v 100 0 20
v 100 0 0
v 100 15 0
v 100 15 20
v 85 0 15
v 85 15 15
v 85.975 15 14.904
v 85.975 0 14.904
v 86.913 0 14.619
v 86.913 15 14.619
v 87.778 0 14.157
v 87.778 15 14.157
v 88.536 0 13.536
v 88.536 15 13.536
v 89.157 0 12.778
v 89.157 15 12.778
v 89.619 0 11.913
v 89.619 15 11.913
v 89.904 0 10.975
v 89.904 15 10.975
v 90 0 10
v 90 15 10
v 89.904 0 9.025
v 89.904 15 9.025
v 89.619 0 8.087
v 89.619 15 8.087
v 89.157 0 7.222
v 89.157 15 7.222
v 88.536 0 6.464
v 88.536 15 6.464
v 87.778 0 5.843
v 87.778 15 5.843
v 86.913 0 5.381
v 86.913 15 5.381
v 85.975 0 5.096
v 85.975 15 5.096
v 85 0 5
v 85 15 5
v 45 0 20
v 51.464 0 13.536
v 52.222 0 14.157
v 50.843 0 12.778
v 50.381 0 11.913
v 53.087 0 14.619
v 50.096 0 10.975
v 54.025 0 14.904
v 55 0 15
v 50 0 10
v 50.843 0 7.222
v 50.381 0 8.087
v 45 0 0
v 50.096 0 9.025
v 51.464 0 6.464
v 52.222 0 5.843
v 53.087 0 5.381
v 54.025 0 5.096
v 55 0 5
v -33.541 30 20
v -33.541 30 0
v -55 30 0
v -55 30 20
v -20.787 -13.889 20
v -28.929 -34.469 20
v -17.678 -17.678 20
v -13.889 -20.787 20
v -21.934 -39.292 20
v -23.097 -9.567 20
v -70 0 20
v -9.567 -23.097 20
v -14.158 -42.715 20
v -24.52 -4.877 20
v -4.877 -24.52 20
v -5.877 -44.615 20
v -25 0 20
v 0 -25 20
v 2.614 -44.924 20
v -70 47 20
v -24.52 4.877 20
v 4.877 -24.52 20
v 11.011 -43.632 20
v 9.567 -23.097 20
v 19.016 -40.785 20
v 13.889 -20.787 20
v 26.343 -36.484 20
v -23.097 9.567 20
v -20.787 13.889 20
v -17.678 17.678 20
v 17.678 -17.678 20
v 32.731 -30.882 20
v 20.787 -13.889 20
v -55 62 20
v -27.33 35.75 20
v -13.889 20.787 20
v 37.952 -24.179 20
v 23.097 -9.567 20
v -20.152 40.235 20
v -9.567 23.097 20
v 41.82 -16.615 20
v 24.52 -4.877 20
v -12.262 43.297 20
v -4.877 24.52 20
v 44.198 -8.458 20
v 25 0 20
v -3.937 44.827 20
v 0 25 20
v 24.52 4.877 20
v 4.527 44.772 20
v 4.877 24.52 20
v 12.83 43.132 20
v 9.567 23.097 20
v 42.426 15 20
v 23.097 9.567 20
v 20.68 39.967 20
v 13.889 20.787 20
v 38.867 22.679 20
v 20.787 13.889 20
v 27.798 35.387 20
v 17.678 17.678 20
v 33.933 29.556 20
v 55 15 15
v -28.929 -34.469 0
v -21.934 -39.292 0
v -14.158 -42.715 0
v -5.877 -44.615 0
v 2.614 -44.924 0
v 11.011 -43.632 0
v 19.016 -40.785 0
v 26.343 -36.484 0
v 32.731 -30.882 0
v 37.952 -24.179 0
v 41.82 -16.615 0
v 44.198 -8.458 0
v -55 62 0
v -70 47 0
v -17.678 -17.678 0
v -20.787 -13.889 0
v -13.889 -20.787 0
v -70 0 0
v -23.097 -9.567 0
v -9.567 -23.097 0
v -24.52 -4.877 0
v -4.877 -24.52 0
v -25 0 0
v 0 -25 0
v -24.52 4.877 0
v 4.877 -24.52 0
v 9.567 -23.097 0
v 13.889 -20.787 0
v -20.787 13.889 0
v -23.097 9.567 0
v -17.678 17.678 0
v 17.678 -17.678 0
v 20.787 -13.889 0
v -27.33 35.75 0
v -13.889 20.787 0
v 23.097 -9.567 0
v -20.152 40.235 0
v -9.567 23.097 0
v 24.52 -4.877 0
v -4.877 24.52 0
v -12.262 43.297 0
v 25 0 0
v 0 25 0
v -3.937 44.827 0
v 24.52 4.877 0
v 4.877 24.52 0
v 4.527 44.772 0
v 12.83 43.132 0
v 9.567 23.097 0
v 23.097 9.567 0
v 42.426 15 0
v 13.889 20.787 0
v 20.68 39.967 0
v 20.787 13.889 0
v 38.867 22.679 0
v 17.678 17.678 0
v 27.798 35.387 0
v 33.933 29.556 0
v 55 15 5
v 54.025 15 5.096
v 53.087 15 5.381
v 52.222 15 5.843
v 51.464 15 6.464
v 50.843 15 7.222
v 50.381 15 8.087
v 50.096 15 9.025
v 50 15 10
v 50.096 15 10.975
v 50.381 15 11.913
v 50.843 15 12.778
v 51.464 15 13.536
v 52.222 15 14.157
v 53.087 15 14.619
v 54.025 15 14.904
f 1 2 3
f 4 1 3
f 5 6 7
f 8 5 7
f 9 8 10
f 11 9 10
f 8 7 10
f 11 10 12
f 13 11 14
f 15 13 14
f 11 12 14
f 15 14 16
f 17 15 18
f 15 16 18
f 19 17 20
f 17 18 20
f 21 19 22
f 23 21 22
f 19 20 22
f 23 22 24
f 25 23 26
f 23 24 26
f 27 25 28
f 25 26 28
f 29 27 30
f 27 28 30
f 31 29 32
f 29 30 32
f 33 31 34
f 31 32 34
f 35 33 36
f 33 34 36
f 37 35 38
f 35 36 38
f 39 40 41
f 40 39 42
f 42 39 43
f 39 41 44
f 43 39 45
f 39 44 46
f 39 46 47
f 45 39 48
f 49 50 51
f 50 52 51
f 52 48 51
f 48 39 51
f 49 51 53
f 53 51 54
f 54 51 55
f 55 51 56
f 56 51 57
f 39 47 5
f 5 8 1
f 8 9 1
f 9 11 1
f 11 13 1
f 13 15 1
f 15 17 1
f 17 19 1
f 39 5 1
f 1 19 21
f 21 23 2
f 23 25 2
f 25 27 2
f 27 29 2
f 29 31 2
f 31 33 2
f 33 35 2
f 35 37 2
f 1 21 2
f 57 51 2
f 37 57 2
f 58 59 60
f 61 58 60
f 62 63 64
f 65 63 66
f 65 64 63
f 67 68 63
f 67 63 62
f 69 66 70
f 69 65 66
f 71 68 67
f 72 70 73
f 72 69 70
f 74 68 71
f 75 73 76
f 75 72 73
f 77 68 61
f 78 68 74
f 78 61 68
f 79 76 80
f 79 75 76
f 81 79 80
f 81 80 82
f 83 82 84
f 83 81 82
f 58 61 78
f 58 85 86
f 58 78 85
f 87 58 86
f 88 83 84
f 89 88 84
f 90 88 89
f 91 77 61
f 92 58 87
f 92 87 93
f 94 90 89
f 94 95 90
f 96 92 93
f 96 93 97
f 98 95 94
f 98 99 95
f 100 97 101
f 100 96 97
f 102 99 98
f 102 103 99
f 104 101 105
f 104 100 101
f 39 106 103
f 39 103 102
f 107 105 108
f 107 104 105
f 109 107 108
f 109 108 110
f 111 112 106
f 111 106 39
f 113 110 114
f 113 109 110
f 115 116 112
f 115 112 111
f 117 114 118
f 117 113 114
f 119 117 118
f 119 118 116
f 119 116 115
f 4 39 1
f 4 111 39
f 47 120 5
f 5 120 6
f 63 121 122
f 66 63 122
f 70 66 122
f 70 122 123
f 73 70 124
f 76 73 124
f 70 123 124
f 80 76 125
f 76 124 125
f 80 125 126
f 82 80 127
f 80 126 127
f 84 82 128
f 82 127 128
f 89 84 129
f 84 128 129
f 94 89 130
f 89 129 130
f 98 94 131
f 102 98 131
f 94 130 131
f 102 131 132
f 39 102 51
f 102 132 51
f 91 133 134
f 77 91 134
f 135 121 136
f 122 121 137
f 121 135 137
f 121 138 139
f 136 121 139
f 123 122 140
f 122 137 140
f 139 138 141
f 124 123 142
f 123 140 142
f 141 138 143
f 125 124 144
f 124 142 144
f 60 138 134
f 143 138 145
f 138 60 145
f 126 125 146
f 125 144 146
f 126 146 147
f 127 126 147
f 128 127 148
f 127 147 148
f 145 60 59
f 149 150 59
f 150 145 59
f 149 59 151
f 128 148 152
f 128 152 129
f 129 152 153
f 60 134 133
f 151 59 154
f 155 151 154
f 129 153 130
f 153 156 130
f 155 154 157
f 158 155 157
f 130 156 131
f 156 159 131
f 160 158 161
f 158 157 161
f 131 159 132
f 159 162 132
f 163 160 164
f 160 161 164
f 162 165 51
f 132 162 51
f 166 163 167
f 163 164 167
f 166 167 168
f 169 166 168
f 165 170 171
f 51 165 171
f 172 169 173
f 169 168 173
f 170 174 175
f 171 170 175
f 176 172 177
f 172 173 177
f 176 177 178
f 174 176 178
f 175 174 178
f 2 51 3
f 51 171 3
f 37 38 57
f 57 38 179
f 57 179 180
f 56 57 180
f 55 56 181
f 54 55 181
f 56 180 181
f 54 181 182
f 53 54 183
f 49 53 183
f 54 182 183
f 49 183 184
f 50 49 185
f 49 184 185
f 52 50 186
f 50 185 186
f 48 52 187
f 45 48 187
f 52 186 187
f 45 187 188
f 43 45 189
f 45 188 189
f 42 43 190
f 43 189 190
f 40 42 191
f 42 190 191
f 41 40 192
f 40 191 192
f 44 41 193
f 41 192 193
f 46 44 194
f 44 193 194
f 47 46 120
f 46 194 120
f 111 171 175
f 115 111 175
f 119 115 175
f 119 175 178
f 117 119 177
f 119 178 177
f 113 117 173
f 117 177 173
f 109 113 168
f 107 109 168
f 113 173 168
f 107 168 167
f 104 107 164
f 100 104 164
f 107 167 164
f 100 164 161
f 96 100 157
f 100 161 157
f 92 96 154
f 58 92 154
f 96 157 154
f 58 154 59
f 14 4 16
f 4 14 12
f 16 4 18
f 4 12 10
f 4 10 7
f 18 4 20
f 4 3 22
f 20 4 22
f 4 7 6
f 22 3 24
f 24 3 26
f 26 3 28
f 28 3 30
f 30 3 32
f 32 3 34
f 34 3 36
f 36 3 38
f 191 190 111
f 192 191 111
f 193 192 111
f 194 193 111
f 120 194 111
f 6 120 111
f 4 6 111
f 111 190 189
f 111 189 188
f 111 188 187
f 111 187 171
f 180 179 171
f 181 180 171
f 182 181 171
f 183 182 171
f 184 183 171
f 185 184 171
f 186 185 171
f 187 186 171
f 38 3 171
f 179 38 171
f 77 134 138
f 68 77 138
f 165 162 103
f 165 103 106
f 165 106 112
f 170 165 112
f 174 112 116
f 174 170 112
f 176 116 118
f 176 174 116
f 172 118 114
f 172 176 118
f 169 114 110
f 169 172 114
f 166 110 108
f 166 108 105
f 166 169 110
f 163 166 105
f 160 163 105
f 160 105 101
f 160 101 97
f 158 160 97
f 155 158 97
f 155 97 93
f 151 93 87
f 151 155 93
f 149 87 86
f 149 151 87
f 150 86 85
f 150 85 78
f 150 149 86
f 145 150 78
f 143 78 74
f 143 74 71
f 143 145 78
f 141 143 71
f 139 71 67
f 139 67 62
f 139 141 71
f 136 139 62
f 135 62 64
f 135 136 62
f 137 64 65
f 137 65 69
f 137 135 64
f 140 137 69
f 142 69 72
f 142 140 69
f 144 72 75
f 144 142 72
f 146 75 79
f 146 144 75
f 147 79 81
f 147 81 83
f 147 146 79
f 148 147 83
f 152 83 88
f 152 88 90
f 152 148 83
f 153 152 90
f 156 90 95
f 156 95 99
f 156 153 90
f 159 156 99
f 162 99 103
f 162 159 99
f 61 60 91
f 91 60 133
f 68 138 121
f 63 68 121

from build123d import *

# Parameters (mm, degrees)
SKETCH1_R           = 25
BOSS_EXTRUDE1_DEPTH = 20
CUT_EXTRUDE1_DEPTH  = 61


with BuildPart() as part:
    # Sketch1 → Boss-Extrude1 (new body)
    with BuildSketch(Plane.XY):
        with BuildLine():
            Line((-70, 0), (-28.928571429, -34.469374162))
            ThreePointArc((-28.928571429, -34.469374162), (19.015970731, -40.784713523), (45, 0))
            Line((45, 0), (100, 0))
            Line((100, 0), (100, 15))
            Line((100, 15), (42.426406871, 15))
            ThreePointArc((42.426406871, 15), (8.717082451, 44.14762138), (-33.541019662, 30))
            Line((-33.541019662, 30), (-55, 30))
            Line((-55, 30), (-55, 62))
            Line((-55, 62), (-70, 47))
            Line((-70, 47), (-70, 0))
        make_face()
        Circle(SKETCH1_R, mode=Mode.SUBTRACT)
    extrude(amount=BOSS_EXTRUDE1_DEPTH)

    # Sketch2 → Cut-Extrude1 (cut, through all)
    with BuildSketch(Plane(origin=(0, 15, 0), x_dir=(1, 0, 0), z_dir=(0, 1, 0))):
        with BuildLine():
            Line((55, -15), (85, -15))
            ThreePointArc((85, -15), (90, -10), (85, -5))
            Line((85, -5), (55, -5))
            ThreePointArc((55, -5), (50, -10), (55, -15))
        make_face()
    extrude(amount=-CUT_EXTRUDE1_DEPTH, mode=Mode.SUBTRACT)


solid = part.part
